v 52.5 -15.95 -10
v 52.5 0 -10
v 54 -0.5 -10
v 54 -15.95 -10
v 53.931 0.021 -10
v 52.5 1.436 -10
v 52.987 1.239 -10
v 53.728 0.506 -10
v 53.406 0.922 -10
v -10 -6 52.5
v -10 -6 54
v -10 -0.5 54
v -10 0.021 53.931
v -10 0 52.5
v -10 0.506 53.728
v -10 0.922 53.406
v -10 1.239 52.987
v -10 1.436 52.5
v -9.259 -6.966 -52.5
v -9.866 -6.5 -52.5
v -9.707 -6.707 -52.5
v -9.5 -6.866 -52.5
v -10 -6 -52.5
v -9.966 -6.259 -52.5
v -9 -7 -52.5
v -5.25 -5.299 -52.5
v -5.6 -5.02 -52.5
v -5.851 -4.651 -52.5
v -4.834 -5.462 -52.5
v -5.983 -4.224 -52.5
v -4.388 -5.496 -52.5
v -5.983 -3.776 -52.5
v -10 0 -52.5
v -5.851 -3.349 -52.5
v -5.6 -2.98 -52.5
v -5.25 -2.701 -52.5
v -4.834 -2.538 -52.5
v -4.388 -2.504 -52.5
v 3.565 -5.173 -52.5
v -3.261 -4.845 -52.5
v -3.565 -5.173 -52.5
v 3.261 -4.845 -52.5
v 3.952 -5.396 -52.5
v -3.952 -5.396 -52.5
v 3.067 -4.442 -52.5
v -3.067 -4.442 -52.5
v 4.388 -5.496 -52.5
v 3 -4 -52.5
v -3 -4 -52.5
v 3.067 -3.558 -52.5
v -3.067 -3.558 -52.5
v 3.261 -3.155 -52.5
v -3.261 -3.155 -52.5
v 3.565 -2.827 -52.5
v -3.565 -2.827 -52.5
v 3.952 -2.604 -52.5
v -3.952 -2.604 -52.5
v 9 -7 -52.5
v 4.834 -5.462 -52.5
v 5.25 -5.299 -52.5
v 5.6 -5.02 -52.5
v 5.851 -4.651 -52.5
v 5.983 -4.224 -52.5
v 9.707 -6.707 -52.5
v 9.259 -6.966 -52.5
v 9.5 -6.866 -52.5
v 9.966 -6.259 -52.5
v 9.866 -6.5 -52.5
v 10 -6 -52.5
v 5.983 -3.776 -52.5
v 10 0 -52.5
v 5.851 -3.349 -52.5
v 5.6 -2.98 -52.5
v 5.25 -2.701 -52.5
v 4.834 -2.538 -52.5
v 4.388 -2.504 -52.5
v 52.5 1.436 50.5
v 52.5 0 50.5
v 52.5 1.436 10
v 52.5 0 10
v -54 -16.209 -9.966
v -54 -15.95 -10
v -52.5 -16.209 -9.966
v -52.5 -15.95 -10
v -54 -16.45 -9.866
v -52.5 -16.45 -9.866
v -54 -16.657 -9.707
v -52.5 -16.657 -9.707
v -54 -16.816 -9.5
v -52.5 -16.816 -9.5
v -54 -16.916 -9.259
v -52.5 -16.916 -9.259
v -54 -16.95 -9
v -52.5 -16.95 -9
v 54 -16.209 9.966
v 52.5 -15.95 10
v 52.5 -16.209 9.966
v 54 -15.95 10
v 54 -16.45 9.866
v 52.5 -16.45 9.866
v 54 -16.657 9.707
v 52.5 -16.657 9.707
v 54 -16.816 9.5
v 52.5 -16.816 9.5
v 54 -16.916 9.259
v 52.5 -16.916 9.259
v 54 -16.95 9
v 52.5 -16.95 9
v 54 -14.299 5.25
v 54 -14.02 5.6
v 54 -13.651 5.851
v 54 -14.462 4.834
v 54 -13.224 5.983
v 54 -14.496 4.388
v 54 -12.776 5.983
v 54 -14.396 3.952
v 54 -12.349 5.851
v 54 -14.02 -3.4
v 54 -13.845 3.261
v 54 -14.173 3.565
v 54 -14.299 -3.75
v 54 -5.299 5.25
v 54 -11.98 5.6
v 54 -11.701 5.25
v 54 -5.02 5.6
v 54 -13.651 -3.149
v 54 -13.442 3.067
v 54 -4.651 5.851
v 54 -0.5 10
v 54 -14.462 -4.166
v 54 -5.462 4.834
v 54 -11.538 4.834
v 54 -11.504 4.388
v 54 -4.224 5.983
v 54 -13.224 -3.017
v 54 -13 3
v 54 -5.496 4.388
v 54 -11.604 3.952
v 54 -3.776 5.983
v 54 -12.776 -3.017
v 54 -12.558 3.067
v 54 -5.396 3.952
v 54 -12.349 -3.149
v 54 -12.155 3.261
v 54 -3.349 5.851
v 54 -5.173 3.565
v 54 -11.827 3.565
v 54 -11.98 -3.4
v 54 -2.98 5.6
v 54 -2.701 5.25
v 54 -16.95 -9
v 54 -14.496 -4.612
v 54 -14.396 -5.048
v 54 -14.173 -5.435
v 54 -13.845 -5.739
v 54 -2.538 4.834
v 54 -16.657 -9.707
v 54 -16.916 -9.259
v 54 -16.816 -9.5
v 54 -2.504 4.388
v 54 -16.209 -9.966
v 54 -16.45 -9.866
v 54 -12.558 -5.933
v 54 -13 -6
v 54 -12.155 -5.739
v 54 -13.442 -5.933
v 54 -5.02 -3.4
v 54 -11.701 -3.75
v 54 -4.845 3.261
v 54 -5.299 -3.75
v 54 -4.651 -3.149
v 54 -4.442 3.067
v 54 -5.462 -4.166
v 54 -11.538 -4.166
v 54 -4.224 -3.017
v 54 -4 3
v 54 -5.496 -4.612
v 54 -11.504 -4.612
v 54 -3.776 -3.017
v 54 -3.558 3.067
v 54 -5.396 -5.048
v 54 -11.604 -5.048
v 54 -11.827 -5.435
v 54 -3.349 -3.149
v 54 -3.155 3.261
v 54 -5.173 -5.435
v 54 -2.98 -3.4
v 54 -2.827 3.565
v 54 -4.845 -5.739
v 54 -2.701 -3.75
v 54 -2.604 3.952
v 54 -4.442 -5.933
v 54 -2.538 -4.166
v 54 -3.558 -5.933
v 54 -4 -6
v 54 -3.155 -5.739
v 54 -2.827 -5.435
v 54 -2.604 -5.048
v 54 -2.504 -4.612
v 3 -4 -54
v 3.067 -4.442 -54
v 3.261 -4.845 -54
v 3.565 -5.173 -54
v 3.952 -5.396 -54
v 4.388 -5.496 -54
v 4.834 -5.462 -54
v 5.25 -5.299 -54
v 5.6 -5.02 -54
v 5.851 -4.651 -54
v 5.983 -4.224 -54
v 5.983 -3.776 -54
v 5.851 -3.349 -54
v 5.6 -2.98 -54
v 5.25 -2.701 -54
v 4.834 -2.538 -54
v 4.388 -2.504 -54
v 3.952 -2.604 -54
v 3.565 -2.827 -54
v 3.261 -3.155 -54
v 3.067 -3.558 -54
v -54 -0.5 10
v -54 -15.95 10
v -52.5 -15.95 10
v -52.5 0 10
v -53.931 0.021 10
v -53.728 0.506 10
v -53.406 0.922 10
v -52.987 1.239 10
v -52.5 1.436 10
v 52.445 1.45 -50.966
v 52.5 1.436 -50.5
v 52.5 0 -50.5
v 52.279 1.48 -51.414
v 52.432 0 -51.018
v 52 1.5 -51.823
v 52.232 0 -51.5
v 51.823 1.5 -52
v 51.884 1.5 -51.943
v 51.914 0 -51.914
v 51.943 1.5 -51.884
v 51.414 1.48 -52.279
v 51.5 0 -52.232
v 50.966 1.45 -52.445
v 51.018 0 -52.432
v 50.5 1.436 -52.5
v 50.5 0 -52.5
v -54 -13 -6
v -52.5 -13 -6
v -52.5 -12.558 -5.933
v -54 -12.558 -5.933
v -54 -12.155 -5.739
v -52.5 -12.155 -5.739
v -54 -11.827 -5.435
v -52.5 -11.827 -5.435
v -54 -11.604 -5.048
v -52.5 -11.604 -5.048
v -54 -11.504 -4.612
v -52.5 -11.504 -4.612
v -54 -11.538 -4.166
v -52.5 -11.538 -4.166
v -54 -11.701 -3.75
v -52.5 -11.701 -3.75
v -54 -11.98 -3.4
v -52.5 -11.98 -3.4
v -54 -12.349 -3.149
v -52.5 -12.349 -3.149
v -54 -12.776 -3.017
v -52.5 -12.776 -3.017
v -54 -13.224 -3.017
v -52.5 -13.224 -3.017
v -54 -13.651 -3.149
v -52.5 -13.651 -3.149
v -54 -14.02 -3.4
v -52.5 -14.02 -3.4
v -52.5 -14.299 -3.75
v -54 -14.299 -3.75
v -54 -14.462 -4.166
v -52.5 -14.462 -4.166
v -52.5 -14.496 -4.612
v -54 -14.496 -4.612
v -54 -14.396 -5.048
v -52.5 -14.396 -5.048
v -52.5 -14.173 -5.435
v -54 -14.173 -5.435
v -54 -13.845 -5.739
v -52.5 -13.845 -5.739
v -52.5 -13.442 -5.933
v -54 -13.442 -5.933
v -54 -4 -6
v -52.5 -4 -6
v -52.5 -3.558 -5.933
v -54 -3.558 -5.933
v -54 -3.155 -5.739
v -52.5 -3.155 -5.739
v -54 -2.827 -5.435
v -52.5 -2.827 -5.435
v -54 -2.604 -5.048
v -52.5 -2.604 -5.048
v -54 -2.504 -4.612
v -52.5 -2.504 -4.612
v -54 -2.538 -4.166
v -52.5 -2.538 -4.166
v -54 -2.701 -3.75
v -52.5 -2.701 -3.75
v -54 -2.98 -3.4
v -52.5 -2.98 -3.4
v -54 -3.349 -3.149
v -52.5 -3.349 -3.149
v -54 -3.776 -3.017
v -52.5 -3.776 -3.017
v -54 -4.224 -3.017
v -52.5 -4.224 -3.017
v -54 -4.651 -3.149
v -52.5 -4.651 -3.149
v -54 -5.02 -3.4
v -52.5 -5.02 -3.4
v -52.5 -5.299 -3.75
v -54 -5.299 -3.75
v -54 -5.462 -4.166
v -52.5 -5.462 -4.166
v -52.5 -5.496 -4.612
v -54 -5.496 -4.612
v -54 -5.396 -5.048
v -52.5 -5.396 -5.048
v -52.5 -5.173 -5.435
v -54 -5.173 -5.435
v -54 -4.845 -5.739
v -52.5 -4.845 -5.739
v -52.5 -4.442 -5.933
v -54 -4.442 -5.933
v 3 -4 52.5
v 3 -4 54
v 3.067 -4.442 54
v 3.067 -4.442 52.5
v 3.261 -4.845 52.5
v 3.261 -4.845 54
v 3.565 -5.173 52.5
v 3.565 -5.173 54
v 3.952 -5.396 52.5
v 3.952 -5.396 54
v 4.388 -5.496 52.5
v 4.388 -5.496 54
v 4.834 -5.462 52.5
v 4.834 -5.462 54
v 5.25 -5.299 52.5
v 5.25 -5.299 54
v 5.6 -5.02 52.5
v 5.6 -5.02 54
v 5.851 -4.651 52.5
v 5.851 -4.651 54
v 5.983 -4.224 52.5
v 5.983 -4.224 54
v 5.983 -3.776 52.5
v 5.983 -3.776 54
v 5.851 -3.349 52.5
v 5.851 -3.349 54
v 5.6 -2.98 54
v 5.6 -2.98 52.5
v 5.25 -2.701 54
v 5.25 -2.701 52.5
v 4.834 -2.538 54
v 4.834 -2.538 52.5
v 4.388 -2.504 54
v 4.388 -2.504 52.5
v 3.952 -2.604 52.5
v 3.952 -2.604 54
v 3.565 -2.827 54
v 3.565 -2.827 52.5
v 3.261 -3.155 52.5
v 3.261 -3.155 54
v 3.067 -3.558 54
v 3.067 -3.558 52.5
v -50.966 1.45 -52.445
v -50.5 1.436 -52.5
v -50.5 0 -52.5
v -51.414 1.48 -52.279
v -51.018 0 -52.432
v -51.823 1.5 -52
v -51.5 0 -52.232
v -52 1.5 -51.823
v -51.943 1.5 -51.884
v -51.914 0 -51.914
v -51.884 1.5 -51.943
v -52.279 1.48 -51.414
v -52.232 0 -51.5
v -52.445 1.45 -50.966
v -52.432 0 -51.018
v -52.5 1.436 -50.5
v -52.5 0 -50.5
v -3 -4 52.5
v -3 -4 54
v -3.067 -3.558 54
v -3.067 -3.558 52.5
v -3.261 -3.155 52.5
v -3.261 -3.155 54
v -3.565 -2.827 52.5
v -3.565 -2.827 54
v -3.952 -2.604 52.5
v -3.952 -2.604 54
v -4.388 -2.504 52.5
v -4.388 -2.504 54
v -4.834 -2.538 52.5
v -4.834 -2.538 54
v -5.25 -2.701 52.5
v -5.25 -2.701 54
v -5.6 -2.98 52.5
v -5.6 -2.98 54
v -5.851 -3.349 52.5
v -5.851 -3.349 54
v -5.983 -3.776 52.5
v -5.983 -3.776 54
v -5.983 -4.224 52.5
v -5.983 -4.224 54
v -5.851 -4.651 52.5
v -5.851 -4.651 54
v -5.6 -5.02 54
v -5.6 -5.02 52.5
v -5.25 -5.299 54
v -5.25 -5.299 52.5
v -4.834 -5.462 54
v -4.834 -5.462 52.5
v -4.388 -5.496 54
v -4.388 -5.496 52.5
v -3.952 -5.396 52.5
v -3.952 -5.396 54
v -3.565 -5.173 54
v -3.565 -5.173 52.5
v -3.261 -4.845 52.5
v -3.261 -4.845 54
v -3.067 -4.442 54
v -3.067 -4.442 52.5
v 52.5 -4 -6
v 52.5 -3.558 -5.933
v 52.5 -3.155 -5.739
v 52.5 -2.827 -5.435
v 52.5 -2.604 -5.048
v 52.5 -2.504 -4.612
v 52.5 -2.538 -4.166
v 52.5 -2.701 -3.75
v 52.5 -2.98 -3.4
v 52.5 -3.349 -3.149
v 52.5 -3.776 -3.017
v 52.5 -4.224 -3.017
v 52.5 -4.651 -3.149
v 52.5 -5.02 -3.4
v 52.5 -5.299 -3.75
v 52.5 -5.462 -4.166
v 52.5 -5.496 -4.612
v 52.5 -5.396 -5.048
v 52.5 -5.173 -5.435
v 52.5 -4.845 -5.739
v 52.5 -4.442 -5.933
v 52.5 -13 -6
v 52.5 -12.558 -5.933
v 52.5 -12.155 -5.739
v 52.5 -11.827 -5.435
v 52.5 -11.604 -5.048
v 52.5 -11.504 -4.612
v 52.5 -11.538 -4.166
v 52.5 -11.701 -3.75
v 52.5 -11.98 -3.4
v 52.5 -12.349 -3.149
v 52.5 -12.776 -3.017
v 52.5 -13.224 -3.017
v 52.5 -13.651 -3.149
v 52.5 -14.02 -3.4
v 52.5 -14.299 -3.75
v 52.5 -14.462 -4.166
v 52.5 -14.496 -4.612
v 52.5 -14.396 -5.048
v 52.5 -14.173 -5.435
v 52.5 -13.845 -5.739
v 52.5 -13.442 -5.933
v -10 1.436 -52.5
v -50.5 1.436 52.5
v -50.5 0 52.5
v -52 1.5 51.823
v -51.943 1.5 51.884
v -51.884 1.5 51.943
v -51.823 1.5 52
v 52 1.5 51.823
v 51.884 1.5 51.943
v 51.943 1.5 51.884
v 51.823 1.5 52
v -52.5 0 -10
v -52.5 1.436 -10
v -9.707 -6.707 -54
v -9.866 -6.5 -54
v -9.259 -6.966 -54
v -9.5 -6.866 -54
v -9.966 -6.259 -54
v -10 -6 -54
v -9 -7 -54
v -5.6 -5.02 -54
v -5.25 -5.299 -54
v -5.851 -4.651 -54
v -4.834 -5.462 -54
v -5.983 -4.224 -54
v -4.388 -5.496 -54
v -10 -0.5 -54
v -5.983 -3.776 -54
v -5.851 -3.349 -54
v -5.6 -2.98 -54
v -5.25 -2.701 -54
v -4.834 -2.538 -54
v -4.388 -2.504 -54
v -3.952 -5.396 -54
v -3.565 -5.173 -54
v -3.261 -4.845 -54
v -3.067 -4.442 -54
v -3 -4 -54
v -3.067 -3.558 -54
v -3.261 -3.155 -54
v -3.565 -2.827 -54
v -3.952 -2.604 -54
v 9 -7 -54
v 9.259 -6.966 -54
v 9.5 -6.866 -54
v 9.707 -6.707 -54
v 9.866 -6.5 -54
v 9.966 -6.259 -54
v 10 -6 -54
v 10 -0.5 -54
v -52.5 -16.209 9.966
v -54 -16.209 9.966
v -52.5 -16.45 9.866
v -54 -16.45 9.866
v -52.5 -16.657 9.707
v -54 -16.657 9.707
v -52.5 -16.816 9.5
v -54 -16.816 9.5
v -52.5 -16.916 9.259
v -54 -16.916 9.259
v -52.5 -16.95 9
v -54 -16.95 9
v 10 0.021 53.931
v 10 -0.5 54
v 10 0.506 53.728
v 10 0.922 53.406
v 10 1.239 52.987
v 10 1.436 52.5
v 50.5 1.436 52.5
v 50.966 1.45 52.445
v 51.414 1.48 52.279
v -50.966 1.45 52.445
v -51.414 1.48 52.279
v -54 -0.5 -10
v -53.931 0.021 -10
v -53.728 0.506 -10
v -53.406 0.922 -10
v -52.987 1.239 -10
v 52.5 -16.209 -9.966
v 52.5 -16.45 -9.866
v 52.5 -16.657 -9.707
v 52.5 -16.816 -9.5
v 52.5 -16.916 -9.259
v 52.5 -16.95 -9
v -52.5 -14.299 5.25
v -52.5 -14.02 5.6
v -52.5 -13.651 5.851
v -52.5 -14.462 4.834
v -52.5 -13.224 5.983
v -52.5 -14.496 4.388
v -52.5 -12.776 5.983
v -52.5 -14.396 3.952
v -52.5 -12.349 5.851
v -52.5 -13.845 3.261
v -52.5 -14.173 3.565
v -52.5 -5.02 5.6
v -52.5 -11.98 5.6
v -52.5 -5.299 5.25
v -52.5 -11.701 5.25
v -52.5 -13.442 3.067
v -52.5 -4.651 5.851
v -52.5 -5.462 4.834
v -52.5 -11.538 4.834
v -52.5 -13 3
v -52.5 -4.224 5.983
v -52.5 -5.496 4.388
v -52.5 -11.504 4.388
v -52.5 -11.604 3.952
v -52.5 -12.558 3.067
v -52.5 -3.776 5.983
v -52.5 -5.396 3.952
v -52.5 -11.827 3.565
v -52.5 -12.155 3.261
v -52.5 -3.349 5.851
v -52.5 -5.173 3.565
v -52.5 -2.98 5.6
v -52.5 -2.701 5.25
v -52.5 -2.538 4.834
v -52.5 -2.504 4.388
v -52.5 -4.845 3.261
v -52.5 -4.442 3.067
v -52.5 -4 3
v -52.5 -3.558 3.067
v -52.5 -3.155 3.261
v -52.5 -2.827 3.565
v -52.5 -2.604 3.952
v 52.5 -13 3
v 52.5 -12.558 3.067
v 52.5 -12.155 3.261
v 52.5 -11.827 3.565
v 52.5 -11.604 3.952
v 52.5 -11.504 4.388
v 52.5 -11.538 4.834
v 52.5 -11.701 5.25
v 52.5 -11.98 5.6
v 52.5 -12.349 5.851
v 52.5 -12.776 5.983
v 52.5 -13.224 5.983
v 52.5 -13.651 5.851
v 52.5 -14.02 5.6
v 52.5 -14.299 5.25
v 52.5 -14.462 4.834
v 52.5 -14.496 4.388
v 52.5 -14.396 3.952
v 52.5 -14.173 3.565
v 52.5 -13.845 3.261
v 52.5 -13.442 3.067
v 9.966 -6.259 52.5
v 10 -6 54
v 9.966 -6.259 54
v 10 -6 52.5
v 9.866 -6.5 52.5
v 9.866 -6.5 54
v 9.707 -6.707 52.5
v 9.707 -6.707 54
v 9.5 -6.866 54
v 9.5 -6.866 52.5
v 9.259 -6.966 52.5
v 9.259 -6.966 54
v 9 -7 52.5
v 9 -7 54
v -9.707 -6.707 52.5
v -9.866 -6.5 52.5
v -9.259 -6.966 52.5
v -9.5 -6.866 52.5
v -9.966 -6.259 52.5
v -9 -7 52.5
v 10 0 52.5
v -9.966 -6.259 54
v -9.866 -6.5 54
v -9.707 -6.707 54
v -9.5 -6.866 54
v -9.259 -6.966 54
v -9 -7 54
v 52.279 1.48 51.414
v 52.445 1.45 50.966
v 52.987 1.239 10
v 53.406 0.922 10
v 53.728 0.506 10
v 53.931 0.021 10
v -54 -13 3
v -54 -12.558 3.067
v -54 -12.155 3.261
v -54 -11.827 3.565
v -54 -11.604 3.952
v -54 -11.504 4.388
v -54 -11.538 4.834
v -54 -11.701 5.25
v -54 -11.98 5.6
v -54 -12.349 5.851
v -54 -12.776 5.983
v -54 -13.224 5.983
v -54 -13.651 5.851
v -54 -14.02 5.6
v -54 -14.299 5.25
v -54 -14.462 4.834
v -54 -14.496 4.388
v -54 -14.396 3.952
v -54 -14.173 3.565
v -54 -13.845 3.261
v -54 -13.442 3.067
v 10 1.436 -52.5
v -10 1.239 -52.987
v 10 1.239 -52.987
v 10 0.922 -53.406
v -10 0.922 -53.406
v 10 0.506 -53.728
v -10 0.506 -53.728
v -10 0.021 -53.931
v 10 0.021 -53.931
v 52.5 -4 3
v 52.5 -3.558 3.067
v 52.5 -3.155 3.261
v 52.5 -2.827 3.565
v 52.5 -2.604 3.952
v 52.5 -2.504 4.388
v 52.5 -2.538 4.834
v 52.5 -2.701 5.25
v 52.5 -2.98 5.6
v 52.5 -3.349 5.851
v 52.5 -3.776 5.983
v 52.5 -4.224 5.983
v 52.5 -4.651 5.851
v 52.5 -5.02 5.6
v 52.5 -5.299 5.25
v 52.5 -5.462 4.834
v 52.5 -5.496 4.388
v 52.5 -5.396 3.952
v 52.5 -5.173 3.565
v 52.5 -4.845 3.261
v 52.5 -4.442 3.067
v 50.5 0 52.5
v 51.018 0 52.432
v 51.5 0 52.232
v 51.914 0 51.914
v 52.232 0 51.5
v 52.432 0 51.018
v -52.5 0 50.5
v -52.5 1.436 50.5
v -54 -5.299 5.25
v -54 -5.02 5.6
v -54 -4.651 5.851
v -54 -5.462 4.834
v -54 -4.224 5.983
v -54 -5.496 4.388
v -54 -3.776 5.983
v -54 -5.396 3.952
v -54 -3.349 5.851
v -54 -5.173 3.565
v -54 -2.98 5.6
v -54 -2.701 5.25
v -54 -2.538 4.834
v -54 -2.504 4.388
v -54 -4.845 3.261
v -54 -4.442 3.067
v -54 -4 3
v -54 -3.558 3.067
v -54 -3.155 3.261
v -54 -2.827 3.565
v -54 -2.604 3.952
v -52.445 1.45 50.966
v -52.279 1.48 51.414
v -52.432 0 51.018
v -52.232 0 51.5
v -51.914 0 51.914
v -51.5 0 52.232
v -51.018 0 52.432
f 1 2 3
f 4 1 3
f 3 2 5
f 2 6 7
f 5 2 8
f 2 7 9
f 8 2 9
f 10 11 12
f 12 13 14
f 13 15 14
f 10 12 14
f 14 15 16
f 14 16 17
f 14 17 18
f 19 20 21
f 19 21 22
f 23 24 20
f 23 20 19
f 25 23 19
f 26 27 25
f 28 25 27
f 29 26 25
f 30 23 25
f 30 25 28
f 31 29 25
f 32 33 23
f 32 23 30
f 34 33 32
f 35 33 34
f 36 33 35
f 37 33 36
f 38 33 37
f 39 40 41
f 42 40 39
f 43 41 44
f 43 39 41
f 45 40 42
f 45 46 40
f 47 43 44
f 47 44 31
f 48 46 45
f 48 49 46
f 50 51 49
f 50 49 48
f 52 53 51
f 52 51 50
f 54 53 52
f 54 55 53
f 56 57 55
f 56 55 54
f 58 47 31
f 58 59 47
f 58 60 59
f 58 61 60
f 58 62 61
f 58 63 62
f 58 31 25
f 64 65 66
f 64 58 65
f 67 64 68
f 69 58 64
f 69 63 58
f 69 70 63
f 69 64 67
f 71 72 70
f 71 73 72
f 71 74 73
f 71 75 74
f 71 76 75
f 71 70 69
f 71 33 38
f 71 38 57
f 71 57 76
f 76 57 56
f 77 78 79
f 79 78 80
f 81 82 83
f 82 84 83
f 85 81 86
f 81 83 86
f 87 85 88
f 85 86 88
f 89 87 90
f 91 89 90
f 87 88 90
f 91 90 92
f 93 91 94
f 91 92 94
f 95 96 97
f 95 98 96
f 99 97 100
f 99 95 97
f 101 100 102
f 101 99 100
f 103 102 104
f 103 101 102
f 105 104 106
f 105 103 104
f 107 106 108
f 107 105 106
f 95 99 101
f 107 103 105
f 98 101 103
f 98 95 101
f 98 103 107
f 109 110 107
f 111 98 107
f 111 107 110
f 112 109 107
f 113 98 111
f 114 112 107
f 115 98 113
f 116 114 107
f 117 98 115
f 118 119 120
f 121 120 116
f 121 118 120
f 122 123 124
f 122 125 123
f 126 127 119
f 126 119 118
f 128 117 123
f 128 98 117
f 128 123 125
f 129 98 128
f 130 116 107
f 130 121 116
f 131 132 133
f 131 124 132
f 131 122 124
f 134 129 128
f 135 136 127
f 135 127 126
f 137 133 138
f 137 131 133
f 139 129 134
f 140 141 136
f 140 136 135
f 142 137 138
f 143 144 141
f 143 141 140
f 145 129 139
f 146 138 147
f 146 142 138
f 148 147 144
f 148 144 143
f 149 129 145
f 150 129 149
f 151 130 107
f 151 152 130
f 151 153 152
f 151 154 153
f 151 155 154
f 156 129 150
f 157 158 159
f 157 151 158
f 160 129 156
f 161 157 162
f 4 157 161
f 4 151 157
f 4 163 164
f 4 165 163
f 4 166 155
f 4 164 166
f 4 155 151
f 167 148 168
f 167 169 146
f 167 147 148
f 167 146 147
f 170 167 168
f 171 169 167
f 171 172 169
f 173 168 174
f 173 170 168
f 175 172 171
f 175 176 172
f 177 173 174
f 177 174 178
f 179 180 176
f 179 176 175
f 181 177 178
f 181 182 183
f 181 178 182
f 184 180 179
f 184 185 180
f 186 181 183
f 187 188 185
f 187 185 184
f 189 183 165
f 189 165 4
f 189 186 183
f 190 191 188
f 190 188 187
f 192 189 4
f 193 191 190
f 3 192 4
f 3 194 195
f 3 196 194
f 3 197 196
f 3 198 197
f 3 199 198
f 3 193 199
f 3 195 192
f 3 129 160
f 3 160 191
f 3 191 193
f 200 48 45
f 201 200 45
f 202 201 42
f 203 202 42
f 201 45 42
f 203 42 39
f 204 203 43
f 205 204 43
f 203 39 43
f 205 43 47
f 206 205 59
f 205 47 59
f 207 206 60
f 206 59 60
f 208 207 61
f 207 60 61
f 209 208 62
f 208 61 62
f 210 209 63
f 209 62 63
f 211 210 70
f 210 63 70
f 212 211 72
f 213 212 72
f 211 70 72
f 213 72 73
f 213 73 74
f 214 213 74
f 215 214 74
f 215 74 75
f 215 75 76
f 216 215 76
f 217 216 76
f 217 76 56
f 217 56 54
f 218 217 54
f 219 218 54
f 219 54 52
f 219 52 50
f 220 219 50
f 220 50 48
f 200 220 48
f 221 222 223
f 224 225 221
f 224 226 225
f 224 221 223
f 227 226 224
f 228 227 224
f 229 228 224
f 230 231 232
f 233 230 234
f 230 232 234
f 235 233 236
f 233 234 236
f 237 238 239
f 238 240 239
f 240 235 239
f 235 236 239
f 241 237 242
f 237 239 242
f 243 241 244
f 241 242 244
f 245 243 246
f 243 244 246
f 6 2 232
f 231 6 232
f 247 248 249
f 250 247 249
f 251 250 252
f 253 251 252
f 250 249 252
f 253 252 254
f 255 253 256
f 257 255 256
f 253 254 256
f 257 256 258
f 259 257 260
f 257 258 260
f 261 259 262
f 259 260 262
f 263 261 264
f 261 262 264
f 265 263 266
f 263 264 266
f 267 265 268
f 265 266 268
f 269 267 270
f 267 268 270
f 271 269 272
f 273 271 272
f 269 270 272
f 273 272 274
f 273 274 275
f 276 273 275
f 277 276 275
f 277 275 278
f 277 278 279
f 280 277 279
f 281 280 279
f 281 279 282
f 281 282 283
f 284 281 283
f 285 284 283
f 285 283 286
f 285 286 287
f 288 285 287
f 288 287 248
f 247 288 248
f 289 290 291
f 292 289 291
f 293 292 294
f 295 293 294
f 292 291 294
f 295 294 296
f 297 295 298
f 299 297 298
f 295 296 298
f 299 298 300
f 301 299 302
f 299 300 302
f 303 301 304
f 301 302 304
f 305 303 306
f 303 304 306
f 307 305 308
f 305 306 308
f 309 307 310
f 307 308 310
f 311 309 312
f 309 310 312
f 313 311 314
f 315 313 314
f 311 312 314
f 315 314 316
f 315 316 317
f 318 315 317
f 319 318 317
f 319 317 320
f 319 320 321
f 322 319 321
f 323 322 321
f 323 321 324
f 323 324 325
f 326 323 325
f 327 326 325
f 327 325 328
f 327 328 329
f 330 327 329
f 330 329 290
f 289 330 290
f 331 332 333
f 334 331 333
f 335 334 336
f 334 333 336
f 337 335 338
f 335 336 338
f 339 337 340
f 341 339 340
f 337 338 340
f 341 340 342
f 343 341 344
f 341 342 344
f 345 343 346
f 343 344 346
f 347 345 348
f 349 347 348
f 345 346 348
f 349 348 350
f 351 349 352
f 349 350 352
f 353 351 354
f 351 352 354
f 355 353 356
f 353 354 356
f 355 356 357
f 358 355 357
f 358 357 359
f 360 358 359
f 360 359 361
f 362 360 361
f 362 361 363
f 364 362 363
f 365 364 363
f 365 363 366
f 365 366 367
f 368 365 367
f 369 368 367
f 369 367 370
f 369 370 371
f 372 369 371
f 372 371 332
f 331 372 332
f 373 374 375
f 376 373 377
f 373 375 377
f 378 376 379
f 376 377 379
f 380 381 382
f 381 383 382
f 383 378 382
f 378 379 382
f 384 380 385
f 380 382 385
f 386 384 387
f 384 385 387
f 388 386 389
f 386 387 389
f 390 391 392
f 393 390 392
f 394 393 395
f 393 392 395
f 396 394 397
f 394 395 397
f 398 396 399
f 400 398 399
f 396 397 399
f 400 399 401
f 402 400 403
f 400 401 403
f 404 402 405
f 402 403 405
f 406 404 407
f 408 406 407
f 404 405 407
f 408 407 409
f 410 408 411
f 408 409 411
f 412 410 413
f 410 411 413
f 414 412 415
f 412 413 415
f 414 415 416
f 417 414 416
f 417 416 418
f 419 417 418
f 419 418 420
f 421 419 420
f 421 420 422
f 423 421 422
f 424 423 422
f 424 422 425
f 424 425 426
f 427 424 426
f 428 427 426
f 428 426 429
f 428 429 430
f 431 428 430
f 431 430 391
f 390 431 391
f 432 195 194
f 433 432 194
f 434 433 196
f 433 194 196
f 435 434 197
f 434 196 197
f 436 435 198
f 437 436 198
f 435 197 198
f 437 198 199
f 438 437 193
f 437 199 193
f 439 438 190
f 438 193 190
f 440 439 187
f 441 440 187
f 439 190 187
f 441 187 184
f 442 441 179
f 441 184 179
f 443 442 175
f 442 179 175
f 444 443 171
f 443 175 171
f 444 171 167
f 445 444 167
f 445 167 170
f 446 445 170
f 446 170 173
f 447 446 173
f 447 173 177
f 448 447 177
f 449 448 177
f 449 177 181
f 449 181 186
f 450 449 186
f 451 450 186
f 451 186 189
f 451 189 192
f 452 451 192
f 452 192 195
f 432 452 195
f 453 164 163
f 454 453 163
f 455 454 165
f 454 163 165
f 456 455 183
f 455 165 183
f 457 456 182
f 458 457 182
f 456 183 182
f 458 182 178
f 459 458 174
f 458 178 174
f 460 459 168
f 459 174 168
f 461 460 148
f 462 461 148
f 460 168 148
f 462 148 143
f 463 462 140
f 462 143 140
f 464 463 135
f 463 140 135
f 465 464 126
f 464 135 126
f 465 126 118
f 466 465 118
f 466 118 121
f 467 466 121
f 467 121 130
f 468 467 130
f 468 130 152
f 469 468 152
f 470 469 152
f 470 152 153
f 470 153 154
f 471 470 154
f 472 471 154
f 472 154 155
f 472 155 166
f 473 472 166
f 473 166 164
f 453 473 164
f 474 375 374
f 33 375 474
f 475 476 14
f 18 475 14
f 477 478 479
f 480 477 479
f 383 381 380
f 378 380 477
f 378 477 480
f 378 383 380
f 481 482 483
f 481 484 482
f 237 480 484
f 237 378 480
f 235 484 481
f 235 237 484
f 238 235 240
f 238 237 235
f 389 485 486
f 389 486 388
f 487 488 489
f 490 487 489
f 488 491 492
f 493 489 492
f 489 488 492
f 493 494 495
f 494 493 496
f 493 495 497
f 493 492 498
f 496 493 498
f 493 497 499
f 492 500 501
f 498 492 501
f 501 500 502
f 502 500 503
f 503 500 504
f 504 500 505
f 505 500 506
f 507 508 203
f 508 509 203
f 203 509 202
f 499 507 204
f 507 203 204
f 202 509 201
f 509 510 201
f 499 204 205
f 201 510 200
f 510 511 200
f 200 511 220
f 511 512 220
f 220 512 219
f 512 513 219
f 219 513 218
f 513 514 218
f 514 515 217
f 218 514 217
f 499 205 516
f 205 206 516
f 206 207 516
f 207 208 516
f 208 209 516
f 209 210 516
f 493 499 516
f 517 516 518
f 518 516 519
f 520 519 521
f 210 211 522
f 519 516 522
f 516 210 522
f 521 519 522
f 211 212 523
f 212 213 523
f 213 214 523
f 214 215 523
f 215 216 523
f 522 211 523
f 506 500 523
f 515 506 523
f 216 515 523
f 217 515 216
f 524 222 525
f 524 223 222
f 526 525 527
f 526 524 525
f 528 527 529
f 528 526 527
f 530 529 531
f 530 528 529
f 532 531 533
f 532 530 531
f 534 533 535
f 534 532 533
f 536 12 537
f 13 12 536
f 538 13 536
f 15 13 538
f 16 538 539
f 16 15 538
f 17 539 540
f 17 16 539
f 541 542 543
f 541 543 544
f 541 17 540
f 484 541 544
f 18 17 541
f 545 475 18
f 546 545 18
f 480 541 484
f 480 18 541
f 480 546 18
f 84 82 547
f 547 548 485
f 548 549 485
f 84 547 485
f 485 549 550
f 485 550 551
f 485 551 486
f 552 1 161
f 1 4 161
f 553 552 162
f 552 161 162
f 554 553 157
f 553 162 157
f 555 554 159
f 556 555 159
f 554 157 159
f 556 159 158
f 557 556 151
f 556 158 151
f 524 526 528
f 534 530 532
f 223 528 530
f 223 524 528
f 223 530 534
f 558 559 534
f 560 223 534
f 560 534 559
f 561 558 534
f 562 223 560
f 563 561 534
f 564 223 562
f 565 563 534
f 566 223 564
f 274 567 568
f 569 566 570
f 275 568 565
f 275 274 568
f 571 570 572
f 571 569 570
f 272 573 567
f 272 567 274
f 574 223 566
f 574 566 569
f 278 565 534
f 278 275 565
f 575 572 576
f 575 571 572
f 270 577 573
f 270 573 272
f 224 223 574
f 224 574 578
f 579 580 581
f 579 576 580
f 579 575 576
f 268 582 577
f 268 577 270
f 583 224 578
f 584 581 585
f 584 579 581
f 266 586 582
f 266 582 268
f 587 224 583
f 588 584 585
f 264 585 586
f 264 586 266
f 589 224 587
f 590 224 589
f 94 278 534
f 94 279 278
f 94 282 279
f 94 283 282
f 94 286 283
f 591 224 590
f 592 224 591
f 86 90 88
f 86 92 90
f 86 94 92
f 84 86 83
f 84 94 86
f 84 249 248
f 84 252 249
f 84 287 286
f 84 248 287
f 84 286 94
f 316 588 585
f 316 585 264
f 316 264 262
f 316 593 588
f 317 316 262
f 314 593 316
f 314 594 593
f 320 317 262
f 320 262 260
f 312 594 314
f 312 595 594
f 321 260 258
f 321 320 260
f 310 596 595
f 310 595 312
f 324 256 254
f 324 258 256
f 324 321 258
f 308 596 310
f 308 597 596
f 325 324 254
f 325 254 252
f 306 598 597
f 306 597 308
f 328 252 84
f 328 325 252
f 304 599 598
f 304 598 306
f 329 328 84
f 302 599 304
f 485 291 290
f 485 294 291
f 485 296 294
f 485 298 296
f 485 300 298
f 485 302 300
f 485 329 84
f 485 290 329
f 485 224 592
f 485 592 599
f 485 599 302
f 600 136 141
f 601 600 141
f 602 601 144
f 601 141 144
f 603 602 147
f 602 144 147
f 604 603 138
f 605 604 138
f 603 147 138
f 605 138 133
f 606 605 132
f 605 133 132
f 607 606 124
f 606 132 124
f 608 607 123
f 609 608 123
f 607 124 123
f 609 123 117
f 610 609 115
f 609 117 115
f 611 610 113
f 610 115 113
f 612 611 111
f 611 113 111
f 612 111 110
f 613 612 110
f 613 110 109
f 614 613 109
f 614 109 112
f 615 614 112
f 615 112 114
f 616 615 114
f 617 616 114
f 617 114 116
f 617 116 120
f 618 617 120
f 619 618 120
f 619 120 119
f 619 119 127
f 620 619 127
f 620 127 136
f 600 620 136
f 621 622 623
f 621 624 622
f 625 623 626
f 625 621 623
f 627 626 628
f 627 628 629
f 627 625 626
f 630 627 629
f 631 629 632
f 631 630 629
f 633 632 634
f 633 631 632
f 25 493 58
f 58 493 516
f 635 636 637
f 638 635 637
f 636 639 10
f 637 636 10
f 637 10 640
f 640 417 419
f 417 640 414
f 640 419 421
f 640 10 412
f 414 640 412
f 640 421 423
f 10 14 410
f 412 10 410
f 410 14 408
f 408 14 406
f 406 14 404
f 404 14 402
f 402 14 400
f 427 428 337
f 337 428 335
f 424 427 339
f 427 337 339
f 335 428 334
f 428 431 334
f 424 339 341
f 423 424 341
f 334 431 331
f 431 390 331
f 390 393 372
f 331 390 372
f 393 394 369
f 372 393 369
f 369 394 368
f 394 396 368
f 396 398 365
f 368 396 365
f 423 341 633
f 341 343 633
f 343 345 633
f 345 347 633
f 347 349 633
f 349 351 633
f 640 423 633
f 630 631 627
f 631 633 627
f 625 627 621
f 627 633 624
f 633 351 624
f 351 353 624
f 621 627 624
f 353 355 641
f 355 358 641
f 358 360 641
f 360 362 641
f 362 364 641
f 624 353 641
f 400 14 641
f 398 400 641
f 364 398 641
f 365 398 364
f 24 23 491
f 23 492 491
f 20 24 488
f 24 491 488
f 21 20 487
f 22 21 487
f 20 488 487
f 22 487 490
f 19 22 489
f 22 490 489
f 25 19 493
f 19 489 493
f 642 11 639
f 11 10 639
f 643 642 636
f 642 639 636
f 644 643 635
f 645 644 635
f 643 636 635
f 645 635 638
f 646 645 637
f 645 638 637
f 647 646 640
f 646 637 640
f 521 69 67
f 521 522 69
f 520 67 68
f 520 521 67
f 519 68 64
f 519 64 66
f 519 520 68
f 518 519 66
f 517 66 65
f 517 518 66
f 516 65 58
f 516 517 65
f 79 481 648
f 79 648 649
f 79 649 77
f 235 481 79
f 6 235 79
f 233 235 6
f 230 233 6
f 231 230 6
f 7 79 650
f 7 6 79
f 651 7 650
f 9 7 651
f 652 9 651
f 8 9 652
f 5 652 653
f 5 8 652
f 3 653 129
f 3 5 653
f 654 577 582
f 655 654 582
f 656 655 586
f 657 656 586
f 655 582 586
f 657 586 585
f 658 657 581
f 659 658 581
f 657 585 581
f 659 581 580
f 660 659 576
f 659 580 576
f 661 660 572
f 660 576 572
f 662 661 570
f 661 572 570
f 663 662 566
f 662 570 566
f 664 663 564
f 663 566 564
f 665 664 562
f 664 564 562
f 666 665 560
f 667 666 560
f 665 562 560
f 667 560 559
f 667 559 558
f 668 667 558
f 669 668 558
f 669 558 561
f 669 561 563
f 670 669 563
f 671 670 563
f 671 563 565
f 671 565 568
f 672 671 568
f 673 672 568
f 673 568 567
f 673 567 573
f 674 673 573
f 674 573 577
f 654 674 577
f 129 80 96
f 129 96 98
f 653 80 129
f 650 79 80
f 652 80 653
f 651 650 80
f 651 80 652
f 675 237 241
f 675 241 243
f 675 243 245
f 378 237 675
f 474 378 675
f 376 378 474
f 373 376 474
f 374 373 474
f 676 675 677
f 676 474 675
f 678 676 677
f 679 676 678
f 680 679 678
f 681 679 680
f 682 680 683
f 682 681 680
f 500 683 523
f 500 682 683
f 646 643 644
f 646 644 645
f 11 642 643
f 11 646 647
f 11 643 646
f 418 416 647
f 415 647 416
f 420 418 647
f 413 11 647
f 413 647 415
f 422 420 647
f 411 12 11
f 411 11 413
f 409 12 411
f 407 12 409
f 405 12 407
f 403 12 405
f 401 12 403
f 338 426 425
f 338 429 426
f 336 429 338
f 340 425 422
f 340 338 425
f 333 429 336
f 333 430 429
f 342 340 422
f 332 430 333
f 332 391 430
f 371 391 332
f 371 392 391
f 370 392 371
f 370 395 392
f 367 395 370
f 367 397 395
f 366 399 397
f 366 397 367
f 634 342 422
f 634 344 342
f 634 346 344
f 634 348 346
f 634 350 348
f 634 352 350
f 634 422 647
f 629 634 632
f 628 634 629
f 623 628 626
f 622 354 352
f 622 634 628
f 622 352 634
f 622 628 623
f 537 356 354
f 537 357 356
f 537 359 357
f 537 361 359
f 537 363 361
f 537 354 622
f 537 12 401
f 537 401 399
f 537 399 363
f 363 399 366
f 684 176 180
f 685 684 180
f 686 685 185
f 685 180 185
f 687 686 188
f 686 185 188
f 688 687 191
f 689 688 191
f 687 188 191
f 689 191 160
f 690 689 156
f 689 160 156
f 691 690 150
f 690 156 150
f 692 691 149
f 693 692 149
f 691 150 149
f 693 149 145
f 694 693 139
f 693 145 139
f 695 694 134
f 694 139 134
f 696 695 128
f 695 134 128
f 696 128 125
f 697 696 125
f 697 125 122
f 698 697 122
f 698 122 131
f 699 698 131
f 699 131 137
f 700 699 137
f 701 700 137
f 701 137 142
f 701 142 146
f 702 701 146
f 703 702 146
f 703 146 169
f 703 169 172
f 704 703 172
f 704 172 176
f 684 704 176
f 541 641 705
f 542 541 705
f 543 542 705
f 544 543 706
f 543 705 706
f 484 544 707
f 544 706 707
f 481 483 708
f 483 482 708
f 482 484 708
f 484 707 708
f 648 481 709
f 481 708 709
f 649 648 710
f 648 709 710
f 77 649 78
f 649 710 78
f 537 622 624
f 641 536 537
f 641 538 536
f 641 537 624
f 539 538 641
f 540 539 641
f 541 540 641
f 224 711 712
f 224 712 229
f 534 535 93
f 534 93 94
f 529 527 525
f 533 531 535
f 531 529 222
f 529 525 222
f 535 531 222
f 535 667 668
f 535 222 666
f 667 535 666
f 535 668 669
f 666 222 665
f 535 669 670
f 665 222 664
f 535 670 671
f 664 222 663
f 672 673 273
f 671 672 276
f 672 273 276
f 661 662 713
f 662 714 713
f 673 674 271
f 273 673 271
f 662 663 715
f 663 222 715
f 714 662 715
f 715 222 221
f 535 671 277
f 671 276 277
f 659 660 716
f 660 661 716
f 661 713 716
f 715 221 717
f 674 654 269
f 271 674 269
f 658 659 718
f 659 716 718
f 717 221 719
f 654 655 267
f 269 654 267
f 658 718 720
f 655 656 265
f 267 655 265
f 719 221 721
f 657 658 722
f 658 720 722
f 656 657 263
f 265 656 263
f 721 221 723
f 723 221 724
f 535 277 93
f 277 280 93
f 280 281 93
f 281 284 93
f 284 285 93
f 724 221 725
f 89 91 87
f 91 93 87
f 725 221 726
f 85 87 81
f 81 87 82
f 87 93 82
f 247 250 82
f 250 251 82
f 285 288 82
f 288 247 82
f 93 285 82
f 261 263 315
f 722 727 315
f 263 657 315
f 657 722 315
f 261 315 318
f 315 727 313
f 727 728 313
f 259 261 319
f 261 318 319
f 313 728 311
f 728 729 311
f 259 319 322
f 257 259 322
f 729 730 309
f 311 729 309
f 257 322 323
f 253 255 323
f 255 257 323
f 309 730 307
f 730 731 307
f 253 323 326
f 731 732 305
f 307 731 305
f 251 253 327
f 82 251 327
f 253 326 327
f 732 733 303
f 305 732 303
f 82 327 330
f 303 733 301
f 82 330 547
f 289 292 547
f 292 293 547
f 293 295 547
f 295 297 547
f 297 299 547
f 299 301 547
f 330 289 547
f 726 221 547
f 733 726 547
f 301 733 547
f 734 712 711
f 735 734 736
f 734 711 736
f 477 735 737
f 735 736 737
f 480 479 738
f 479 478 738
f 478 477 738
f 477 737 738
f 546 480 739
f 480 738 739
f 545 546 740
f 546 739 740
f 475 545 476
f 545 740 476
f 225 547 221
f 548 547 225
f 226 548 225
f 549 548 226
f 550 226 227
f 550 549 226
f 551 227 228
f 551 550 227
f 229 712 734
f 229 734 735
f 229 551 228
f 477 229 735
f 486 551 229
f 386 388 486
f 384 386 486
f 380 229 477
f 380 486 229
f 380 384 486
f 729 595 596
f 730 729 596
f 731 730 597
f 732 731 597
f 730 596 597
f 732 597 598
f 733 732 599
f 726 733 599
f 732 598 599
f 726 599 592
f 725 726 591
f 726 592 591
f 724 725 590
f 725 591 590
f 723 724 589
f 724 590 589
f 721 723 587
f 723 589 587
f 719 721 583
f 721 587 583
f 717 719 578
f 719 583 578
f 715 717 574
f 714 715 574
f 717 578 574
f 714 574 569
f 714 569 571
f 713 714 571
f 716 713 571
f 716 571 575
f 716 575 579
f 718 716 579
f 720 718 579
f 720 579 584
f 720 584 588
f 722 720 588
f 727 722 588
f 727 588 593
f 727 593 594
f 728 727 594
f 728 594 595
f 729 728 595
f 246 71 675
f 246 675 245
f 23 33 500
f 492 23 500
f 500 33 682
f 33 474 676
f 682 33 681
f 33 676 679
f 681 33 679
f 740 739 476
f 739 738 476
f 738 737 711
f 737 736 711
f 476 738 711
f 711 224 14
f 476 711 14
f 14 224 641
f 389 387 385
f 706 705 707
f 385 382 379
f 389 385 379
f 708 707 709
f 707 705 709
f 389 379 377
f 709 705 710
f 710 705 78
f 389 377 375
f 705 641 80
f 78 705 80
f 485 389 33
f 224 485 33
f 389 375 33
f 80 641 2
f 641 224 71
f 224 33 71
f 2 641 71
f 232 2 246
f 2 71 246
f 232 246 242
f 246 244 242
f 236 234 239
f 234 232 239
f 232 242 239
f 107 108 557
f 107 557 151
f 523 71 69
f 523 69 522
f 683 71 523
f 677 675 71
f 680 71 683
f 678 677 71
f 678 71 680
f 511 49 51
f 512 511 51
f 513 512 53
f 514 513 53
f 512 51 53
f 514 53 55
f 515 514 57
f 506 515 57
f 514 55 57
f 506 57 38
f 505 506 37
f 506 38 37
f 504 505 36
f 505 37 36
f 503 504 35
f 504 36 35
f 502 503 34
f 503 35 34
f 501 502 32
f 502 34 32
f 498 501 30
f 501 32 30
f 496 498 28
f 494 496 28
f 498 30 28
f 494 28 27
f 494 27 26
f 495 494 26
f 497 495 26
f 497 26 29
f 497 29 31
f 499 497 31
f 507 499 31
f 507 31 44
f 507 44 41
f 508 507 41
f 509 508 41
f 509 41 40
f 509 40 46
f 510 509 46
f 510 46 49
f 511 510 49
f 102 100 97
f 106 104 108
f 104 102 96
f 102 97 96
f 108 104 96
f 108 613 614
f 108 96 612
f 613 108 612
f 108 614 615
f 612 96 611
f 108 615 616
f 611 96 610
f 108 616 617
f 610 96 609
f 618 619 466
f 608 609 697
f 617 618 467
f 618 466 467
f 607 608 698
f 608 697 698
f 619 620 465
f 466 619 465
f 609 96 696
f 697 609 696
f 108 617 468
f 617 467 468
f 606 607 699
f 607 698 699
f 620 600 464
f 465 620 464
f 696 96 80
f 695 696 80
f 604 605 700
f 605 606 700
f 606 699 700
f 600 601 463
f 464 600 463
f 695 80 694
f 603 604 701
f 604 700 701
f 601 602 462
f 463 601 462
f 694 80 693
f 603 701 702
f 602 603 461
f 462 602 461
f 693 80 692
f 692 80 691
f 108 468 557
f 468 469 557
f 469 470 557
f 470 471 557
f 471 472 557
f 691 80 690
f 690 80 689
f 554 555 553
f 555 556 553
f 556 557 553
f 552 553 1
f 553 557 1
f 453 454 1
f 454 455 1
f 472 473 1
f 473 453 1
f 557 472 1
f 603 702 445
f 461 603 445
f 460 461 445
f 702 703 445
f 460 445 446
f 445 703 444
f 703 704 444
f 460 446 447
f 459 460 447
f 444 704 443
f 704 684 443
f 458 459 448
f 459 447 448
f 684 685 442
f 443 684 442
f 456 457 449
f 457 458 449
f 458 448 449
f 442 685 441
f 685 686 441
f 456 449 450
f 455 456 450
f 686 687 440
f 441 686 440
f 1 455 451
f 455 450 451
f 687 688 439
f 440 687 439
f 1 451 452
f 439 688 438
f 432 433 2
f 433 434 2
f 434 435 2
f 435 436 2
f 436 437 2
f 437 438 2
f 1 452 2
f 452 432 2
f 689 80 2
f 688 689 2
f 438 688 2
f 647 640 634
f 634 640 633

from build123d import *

# Parameters (mm, degrees)
SKETCH1_W           = 105
SKETCH1_H           = 105
BOSS_EXTRUDE1_DEPTH = 1.5
SKETCH2_W           = 20
SKETCH2_H           = 1.5
BOSS_EXTRUDE2_DEPTH = 8.5
SKETCH3_W           = 1.5
SKETCH3_H           = 20
BOSS_EXTRUDE3_DEPTH = 18.45
SKETCH4_R           = 1.5
CUT_EXTRUDE1_DEPTH  = 122.93154842
SKETCH5_R           = 1.5
CUT_EXTRUDE2_DEPTH  = 122.93154842
FILLET1_R           = 1
FILLET2_START       = -53.84589
FILLET2_DEPTH       = 107.69178
FILLET2_START_2     = -53
FILLET2_2_DEPTH     = 106
FILLET3_R           = 2


with BuildPart() as part:
    # Sketch1 → Boss-Extrude1 (new body)
    with BuildSketch(Plane(origin=(0, 0, 0), x_dir=(1, 0, 0), z_dir=(0, 1, 0))):
        Rectangle(SKETCH1_W, SKETCH1_H)
    extrude(amount=BOSS_EXTRUDE1_DEPTH)

    # Sketch2 → Boss-Extrude2 (add)
    with BuildSketch(Plane(origin=(0, 1.5, 0), x_dir=(1, 0, 0), z_dir=(0, 1, 0))):
        with Locations((0, 53.25)):
            Rectangle(SKETCH2_W, SKETCH2_H)
        with Locations((0, -53.25)):
            Rectangle(SKETCH2_W, SKETCH2_H)
    extrude(amount=-BOSS_EXTRUDE2_DEPTH)

    # Sketch3 → Boss-Extrude3 (add)
    with BuildSketch(Plane(origin=(0, 1.5, 0), x_dir=(1, 0, 0), z_dir=(0, 1, 0))):
        with Locations((53.25, 0)):
            Rectangle(SKETCH3_W, SKETCH3_H)
        with Locations((-53.25, 0)):
            Rectangle(SKETCH3_W, SKETCH3_H)
    extrude(amount=-BOSS_EXTRUDE3_DEPTH)

    # Sketch4 → Cut-Extrude1 (cut, through all)
    with BuildSketch(Plane.XY.offset(54)):
        with Locations((-4.5, -4)):
            Circle(SKETCH4_R)
        with Locations(Location((4.5, -4, 0), (0, 0, 180))):
            Circle(SKETCH4_R)
    extrude(amount=-CUT_EXTRUDE1_DEPTH, mode=Mode.SUBTRACT)

    # Sketch5 → Cut-Extrude2 (cut, through all)
    with BuildSketch(Plane(origin=(54, 0, 0), x_dir=(0, 0, -1), z_dir=(1, 0, 0))):
        with Locations((-4.5, -4)):
            Circle(SKETCH5_R)
        with Locations((4.5, -4)):
            Circle(SKETCH5_R)
        with Locations((4.5, -13)):
            Circle(SKETCH5_R)
        with Locations((-4.5, -13)):
            Circle(SKETCH5_R)
    extrude(amount=-CUT_EXTRUDE2_DEPTH, mode=Mode.SUBTRACT)

    # Fillet1
    fillet1_edges = [part.edges().sort_by_distance(p)[0] for p in [
        (-10, -7, -53.25),
        (10, -7, -53.25),
        (-10, -7, 53.25),
        (10, -7, 53.25),
        (53.25, -16.95, -10),
        (53.25, -16.95, 10),
        (-53.25, -16.95, 10),
        (-53.25, -16.95, -10),
    ]]
    fillet(fillet1_edges, radius=FILLET1_R)

    # Fillet2: read off the stored shape, not the designer's step
    # Fillet2 outline → Fillet2 (cut)
    with BuildSketch(Plane.XY.offset(FILLET2_START)):
        with BuildLine():
            ThreePointArc((52, 1.5), (53.414213562, 0.914213562), (54, -0.5))
            Line((54, -0.5), (54, 1.5))
            Line((54, 1.5), (52, 1.5))
        make_face()
        with BuildLine():
            Line((-52, 1.5), (-54, 1.5))
            Line((-54, 1.5), (-54, -0.5))
            ThreePointArc((-54, -0.5), (-53.414213562, 0.914213562), (-52, 1.5))
        make_face()
    extrude(amount=FILLET2_DEPTH, mode=Mode.SUBTRACT)

    # Fillet2 2 outline → Fillet2 2 (cut)
    with BuildSketch(Plane.YZ.offset(FILLET2_START_2)):
        with BuildLine():
            ThreePointArc((1.5, -52), (0.914213562, -53.414213562), (-0.5, -54))
            Line((-0.5, -54), (1.5, -54))
            Line((1.5, -54), (1.5, -52))
        make_face()
        with BuildLine():
            Line((1.5, 52), (1.5, 54))
            Line((1.5, 54), (-0.5, 54))
            ThreePointArc((-0.5, 54), (0.914213562, 53.414213562), (1.5, 52))
        make_face()
    extrude(amount=FILLET2_2_DEPTH, mode=Mode.SUBTRACT)

    # Fillet3
    # the kernel refuses this fillet: 2 mm, written as the material it takes off along each edge
    with BuildSketch(Plane(origin=(52.5, -5, -52.5), x_dir=(0, 0, 1), z_dir=(0, 1, 0)), Plane(origin=(52.5, -5, 52.5), x_dir=(-1, 0, 0), z_dir=(0, 1, 0)), Plane(origin=(-52.5, -5, -52.5), x_dir=(1, 0, 0), z_dir=(0, 1, 0))) as fillet3_piece_1:
        with BuildLine():
            CenterArc((FILLET3_R, -FILLET3_R), FILLET3_R, 90, 90)
            Line((0, -FILLET3_R), (0, 0))
            Line((0, 0), (FILLET3_R, 0))
        make_face()
    extrude(amount=11.436491673, mode=Mode.SUBTRACT)
    with BuildSketch(Plane(origin=(-52.5, -5, 52.5), x_dir=(1, 0, 0), z_dir=(0, 1, 0))) as fillet3_piece_2:
        with BuildLine():
            CenterArc((FILLET3_R, FILLET3_R), FILLET3_R, 180, 90)
            Line((0, FILLET3_R), (0, 0))
            Line((0, 0), (FILLET3_R, 0))
        make_face()
    extrude(amount=11.436491673, mode=Mode.SUBTRACT)


solid = part.part
